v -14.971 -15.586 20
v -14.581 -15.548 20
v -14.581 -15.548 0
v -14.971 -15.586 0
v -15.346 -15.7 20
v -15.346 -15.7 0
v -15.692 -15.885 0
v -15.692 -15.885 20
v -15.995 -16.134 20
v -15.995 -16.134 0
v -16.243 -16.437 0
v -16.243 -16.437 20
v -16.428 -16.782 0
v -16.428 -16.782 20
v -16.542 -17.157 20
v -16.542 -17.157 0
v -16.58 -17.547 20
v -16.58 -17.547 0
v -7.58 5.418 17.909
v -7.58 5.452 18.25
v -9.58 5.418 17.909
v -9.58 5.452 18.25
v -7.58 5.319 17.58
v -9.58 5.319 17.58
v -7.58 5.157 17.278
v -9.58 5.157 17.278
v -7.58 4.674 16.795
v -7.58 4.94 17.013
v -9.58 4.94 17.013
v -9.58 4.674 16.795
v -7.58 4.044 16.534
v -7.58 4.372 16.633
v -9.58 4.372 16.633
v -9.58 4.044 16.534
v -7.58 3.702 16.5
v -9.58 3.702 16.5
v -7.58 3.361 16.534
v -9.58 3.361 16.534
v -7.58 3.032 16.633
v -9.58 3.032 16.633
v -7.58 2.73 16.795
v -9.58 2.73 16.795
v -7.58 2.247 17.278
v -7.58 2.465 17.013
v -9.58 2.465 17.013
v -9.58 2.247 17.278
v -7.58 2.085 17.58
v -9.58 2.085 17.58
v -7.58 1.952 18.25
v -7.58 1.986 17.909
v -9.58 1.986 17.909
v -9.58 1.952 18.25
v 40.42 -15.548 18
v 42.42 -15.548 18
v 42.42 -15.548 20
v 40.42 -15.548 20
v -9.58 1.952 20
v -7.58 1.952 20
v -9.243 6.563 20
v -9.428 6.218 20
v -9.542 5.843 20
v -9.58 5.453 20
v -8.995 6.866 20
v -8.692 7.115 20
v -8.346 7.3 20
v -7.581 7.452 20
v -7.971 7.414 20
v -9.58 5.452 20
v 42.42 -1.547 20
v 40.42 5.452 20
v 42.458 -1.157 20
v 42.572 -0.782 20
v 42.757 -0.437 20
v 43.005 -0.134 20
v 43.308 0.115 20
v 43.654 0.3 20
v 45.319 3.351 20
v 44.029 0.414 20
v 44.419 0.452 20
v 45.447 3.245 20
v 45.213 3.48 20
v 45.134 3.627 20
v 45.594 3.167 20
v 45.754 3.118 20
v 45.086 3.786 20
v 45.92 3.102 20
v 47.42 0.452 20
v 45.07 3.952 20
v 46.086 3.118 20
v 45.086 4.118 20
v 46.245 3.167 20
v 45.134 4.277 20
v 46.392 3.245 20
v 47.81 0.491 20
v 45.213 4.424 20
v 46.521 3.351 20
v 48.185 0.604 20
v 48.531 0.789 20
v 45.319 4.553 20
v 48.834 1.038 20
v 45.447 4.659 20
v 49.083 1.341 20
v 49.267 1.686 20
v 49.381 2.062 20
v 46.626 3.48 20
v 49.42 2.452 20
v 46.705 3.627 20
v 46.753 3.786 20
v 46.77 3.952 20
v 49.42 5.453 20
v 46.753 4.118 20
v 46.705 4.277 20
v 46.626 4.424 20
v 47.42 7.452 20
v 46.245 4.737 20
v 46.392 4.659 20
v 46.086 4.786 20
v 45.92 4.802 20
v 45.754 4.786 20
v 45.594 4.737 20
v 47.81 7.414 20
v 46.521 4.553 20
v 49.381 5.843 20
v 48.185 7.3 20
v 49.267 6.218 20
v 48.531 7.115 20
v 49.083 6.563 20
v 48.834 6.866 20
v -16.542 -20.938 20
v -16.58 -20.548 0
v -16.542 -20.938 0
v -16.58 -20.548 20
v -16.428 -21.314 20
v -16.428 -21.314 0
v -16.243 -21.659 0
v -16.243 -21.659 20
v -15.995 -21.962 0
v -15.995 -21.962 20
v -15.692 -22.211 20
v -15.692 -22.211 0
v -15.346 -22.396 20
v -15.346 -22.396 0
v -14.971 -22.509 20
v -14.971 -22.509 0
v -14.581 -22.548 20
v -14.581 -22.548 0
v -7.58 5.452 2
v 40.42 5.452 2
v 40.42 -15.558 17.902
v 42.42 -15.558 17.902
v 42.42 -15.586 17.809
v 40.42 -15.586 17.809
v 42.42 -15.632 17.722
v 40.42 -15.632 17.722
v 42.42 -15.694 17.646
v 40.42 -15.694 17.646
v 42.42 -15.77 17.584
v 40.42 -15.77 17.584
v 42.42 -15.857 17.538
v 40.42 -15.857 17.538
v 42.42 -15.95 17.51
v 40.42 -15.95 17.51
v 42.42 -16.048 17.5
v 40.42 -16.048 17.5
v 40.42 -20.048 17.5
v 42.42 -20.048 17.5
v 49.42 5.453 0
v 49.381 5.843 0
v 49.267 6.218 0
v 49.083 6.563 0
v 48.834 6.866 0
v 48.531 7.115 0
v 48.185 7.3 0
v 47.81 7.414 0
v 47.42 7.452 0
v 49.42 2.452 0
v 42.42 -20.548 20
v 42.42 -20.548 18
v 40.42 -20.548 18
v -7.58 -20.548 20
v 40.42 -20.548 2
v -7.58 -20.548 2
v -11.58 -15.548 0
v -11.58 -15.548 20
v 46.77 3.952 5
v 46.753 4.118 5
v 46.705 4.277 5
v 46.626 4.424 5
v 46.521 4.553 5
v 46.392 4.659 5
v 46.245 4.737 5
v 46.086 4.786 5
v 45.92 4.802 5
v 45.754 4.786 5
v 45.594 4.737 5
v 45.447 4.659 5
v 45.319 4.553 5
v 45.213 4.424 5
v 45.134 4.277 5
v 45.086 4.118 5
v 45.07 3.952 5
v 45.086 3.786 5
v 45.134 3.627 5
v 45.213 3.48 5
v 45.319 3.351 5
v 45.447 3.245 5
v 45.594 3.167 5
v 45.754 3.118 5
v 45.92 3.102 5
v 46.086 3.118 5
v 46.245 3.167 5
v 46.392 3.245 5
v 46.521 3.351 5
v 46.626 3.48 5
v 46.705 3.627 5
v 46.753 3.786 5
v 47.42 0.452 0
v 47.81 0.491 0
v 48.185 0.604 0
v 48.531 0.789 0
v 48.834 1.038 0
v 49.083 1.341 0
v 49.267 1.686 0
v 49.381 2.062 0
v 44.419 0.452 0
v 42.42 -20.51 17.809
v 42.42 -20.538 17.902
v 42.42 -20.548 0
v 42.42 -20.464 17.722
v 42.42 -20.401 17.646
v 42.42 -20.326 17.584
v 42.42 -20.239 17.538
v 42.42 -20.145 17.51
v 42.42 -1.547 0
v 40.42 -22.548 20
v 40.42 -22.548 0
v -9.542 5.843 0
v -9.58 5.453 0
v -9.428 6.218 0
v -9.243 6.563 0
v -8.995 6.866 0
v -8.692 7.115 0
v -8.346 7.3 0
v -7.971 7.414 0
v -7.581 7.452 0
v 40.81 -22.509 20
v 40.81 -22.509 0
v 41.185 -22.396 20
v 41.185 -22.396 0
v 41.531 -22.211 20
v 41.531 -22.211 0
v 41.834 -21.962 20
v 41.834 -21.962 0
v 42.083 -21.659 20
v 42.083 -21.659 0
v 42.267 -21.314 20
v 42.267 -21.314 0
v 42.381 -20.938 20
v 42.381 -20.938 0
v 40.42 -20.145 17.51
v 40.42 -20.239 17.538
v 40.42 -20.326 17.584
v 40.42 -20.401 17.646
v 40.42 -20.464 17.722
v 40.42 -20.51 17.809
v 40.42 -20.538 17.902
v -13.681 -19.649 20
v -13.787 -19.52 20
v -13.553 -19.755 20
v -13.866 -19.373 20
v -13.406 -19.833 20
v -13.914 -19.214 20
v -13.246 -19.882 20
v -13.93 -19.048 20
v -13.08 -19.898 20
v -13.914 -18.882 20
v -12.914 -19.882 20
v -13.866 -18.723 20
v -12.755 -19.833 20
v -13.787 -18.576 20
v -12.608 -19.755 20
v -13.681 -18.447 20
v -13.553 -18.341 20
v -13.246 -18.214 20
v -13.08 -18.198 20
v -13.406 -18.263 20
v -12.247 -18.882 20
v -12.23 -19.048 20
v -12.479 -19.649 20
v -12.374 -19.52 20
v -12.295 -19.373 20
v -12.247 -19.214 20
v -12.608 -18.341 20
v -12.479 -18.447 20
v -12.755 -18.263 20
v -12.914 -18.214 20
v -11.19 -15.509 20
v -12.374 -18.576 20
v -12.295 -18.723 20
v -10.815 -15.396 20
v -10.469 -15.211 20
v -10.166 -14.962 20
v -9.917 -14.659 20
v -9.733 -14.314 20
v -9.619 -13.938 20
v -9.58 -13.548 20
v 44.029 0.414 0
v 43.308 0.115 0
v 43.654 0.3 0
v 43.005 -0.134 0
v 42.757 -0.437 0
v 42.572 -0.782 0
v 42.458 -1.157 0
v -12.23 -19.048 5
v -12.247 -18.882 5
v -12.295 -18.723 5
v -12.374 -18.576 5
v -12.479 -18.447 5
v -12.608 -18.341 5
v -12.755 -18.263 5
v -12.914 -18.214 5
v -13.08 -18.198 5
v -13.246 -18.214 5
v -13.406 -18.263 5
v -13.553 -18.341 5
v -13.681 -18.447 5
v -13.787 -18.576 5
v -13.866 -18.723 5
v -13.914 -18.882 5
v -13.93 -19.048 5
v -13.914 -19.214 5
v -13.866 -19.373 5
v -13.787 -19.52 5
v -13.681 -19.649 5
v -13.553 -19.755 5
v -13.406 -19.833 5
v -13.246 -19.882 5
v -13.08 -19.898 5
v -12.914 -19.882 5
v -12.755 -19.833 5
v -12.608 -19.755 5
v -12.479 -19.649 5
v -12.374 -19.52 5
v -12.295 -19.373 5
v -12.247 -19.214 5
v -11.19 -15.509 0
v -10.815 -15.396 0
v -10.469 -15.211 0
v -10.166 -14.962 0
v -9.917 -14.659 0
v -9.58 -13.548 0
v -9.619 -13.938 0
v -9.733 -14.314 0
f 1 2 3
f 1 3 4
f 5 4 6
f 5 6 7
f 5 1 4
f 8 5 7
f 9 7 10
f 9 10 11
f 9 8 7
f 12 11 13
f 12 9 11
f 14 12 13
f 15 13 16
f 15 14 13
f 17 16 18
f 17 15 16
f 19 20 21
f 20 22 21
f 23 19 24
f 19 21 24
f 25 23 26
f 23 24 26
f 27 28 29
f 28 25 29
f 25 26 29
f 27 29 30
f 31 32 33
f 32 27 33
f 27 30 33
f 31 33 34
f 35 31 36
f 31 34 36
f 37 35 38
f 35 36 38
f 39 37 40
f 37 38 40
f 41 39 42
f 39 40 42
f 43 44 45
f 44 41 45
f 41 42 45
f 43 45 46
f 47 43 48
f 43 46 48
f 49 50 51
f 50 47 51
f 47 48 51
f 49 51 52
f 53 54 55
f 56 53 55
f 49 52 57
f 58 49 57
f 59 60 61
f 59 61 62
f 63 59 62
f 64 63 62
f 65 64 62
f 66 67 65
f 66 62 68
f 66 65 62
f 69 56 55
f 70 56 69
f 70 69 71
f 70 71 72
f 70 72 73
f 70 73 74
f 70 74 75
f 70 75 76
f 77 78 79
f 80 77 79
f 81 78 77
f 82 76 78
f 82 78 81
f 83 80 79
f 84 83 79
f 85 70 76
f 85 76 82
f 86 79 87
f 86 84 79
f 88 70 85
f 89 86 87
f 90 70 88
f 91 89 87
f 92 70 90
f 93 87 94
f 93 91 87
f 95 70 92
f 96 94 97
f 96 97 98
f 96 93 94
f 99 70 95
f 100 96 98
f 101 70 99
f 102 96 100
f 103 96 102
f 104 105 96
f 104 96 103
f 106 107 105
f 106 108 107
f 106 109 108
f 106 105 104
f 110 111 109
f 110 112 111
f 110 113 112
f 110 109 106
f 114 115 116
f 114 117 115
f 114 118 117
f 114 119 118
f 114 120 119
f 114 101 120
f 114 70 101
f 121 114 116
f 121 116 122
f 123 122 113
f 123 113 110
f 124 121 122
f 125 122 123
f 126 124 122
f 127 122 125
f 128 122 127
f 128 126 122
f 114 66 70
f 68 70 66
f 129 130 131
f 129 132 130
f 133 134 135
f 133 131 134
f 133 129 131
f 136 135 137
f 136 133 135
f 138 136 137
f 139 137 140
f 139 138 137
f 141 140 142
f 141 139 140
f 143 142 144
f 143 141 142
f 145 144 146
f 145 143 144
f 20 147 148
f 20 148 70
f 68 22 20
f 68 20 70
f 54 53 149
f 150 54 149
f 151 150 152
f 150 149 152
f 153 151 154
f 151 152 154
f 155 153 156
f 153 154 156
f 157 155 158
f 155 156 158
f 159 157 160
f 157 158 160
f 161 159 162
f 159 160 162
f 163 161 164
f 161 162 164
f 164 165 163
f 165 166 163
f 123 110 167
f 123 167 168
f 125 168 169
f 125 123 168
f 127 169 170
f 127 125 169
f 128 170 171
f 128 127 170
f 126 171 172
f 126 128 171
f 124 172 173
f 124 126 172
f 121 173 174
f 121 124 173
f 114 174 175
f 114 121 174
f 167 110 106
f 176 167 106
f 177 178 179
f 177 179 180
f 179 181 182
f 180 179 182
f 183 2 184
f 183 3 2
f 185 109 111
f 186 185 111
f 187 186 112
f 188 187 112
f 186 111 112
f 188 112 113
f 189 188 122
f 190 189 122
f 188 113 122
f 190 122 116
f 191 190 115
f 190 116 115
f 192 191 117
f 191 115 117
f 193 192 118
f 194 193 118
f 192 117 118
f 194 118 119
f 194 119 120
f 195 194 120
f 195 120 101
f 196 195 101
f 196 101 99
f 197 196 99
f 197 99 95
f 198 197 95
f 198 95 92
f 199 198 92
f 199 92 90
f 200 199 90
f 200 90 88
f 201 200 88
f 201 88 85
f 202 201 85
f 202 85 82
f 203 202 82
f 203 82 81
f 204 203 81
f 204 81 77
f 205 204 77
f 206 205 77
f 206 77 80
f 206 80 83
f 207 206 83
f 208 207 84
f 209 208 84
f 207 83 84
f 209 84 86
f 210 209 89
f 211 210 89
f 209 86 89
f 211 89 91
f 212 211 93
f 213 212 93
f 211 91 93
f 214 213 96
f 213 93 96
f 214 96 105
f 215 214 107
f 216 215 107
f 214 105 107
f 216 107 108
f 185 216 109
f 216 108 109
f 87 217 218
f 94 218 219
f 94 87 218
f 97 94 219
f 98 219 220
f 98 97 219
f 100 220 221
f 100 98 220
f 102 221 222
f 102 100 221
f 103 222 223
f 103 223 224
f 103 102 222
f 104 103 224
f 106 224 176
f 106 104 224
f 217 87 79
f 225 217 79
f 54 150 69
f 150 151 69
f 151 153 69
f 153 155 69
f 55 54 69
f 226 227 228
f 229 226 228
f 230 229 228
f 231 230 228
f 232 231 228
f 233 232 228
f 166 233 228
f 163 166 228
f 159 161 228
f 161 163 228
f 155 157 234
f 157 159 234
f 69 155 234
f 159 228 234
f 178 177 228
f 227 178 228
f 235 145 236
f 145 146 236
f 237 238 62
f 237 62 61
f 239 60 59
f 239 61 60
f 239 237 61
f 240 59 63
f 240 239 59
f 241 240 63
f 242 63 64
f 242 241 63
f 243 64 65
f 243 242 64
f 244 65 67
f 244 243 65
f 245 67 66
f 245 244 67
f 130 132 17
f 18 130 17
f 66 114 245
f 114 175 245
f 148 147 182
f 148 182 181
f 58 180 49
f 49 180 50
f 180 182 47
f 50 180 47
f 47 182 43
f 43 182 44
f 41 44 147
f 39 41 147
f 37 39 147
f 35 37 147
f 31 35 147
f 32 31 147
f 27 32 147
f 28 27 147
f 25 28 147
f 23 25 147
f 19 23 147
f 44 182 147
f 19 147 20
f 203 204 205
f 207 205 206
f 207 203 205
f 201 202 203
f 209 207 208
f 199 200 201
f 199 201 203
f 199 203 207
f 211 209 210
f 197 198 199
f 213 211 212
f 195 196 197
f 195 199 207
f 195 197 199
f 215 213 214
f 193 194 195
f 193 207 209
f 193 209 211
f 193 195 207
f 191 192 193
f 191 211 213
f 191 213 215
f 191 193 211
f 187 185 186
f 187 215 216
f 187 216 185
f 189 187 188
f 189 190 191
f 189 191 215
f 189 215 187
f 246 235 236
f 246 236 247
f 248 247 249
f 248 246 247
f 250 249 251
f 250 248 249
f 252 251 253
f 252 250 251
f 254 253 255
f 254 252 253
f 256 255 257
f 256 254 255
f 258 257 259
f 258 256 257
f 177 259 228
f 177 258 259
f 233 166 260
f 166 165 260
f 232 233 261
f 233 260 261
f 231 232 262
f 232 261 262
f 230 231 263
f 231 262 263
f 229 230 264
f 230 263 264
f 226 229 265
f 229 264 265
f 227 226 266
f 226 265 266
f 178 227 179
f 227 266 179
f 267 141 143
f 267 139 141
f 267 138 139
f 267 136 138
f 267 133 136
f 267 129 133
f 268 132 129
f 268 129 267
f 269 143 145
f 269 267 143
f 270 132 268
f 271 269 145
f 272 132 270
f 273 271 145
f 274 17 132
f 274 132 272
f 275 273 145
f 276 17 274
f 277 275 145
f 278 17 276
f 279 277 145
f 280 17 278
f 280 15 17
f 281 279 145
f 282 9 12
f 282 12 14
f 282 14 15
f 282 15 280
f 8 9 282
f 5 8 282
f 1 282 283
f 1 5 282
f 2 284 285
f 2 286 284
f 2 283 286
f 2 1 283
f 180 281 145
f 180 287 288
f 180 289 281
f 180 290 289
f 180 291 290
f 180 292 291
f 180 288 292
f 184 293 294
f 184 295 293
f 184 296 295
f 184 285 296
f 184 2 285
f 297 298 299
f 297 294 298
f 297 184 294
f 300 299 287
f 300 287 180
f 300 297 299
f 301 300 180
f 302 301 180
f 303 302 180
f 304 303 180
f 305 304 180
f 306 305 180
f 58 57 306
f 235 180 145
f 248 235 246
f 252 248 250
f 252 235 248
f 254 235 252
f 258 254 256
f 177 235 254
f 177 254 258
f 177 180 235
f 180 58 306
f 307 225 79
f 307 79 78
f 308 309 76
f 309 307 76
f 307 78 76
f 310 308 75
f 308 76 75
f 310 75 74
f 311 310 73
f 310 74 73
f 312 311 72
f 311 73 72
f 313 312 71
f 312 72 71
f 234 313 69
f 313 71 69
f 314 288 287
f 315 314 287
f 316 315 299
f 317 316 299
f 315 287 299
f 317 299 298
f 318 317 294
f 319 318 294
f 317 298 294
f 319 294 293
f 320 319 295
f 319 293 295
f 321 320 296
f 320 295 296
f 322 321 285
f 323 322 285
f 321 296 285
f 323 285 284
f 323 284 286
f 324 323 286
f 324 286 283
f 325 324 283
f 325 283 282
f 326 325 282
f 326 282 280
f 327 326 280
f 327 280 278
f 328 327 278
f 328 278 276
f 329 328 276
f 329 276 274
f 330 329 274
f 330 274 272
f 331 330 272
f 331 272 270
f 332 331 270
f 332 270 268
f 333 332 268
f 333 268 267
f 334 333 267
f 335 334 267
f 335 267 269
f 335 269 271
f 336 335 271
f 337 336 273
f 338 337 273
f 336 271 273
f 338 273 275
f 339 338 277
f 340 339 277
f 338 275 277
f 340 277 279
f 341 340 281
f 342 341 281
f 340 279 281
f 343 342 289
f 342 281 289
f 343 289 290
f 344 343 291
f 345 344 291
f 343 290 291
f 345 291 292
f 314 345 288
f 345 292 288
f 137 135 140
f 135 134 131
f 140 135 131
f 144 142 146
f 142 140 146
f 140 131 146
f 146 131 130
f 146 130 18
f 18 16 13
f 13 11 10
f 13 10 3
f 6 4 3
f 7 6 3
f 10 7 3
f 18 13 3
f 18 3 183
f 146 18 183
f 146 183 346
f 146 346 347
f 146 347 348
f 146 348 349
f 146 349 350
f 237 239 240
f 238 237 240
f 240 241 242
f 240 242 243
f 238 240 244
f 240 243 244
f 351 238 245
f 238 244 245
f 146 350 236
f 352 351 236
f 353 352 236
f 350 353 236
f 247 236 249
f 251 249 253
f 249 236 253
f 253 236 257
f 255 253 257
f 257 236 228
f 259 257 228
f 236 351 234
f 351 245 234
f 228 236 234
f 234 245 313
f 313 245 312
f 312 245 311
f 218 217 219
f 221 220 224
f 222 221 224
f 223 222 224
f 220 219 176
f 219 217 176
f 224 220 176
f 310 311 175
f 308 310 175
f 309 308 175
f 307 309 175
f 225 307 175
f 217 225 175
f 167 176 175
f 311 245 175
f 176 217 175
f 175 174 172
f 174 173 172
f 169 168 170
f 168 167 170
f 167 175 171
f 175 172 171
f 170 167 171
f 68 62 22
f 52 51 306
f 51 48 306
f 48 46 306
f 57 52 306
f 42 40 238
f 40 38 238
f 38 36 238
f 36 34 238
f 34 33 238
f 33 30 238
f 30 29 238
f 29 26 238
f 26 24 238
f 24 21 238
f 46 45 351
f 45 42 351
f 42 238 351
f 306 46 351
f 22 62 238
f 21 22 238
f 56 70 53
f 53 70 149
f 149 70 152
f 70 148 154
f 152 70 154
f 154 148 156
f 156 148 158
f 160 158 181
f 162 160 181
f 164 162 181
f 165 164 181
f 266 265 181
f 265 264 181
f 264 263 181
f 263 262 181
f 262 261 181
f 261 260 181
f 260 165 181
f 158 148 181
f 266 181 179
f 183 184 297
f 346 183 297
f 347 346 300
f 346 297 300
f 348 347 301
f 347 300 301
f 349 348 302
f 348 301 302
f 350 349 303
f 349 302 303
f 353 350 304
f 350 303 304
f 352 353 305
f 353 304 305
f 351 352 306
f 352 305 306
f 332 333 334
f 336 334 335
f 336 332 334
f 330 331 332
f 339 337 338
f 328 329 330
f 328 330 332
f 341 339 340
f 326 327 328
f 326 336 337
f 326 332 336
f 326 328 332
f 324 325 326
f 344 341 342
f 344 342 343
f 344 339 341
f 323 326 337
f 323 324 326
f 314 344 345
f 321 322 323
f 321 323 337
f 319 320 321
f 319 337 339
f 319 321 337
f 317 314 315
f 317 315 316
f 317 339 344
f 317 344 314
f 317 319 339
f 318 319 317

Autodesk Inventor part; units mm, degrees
ref_plane "YZ Plane" through (0, 0, 0) normal (1, 0, 0) x (0, 1, 0)
ref_plane "XZ Plane" through (0, 0, 0) normal (0, 1, 0) x (-1, 0, 0)
ref_plane "XY Plane" through (0, 0, 0) normal (0, 0, 1) x (1, 0, 0)
sketch "Эскиз1" plane through (0, 0, 0) normal (0, 0, 1) x (1, 0, 0)
  line L0 (-9.5803, -22.5479) -> (42.4197, -22.5479)
  line L1 (42.4197, -22.5479) -> (42.4197, 7.4521)
  line L2 (42.4197, 7.4521) -> (-9.5803, 7.4521)
  line L3 (-9.5803, 7.4521) -> (-9.5803, -22.5479)
extrude "Выдавливание1" add sketch "Эскиз1" along normal blind 2
sketch "Эскиз2" plane through (0, 0, 2) normal (0, 0, 1) x (1, 0, 0)
  line L0 (-9.5803, 7.4521) -> (-9.5803, -22.5479) projected
  line L1 (-9.5803, -22.5479) -> (42.4197, -22.5479) projected
  line L2 (-9.5803, 7.4521) -> (42.4197, 7.4521)
  line L3 (42.4197, 7.4521) -> (42.4197, -22.5479)
  line L4 (42.4197, -22.5479) -> (-9.5803, -22.5479)
  line L5 (-9.5803, -22.5479) -> (-9.5803, 7.4521)
  line L6 (42.4197, 7.4521) -> (-9.5803, 7.4521) projected
  line L7 (-9.5803, 7.4521) -> (-7.5803, 7.4521)
  line L8 (42.4197, -22.5479) -> (40.4197, -22.5479)
  line L9 (40.4197, -20.5479) -> (-7.5803, -20.5479)
  line L10 (-7.5803, -20.5479) -> (-7.5803, 5.4521)
  line L11 (-7.5803, 5.4521) -> (40.4197, 5.4521)
  line L12 (40.4197, 5.4521) -> (40.4197, -20.5479)
  point P0 (0, 0)
extrude "Выдавливание2" add sketch "Эскиз2" along normal blind 18
sketch "Эскиз6" plane through (0, 0, 0) normal (0, 0, -1) x (-1, 0, 0)
  line L0 (9.5803, -22.5479) -> (-42.4197, -22.5479) projected
  line L1 (9.5803, -22.5479) -> (16.5803, -22.5479)
  line L2 (16.5803, -22.5479) -> (16.5803, -15.5479)
  line L3 (16.5803, -15.5479) -> (9.5803, -15.5479)
  line L4 (9.5803, -15.5479) -> (9.5803, -22.5479)
  line L5 (-42.4197, 7.4521) -> (-49.4197, 7.4521)
  line L6 (-49.4197, 7.4521) -> (-49.4197, 0.4521)
  line L7 (-49.4197, 0.4521) -> (-42.4197, 0.4521)
  line L8 (-42.4197, 0.4521) -> (-42.4197, 7.4521)
  point P0 (0, 0)
  dimension "d22" = 7
  dimension "d23" = 7
  dimension "d24" = 7
  dimension "d25" = 7
extrude "Выдавливание5" add sketch "Эскиз6" against normal blind 20
sketch "Эскиз7" plane through (42.4197, -22.5479, 20) normal (1, 0, 0) x (0, 0, -1)
  line L0 (0, 2) -> (0, 28) projected
  line L1 (0, 2) -> (2.5, 2)
  line L2 (2.5, 2) -> (2.5, 7)
  line L3 (2.5, 7) -> (0, 7)
  line L4 (0, 7) -> (0, 2)
  point P0 (20, 22.5479)
  dimension "d28" = 2.5
  dimension "d29" = 5
extrude "Выдавливание6" cut sketch "Эскиз7" against normal blind 2
sketch "Эскиз8" plane through (-9.5803, 7.4521, 0) normal (-1, 0, 0) x (0, 0, 1)
  line L0 (2, -2) -> (20, -2) projected
  line L1 (20, -2) -> (18.25, -2)
  line L2 (16.5, -3.75) -> (16.5, -3.75)
  line L3 (18.25, -5.5) -> (20, -5.5)
  line L4 (20, -5.5) -> (20, -2)
  arc A0 (18.25, -2) -> (16.5, -3.75) centre (18.25, -3.75) ccw
  arc A1 (16.5, -3.75) -> (18.25, -5.5) centre (18.25, -3.75) ccw
  point P0 (0, -7.4521)
  point P1 (16.5, -5.5)
  point P2 (16.5, -2)
  dimension "d32" = 3.5
  dimension "d33" = 3.5
  dimension "d34" = 1.75
extrude "Выдавливание7" cut sketch "Эскиз8" against normal blind 2
fillet "Сопряжение1" radius 0.5 2 edges at (41.4197, -15.5479, 17.5) (41.4197, -20.5479, 17.5)
fillet "Сопряжение2" radius 2 8 edges at (42.4197, 0.4521, 10) (49.4197, 0.4521, 10) (49.4197, 7.4521, 10) (-9.5803, 7.4521, 10) (-16.5803, -22.5479, 10) (-16.5803, -15.5479, 10) (42.4197, -22.5479, 10) (-9.5803, -15.5479, 10)
sketch "Эскиз9" plane through (0, 0, 20) normal (0, 0, 1) x (1, 0, 0)
  circle A0 centre (-13.0803, -19.0479) radius 0.85
  point P0 (0, 0)
  point P1 (-16.5803, -17.5479)
  point P2 (-14.5803, -15.5479)
  dimension "d39" = 1.7
sketch "Эскиз10" plane through (0, 0, 20) normal (0, 0, 1) x (1, 0, 0)
  arc A0 (47.4197, 0.4521) -> (49.4197, 2.4521) centre (47.4197, 2.4521) ccw projected
  circle A1 centre (45.9197, 3.9521) radius 0.85
  point P0 (0, 0)
  dimension "d41" = 1.7
extrude "Выдавливание8" cut sketch "Эскиз9" against normal blind 15
extrude "Выдавливание9" cut sketch "Эскиз10" against normal blind 15
properties part number "Крышка Модуля БП"
